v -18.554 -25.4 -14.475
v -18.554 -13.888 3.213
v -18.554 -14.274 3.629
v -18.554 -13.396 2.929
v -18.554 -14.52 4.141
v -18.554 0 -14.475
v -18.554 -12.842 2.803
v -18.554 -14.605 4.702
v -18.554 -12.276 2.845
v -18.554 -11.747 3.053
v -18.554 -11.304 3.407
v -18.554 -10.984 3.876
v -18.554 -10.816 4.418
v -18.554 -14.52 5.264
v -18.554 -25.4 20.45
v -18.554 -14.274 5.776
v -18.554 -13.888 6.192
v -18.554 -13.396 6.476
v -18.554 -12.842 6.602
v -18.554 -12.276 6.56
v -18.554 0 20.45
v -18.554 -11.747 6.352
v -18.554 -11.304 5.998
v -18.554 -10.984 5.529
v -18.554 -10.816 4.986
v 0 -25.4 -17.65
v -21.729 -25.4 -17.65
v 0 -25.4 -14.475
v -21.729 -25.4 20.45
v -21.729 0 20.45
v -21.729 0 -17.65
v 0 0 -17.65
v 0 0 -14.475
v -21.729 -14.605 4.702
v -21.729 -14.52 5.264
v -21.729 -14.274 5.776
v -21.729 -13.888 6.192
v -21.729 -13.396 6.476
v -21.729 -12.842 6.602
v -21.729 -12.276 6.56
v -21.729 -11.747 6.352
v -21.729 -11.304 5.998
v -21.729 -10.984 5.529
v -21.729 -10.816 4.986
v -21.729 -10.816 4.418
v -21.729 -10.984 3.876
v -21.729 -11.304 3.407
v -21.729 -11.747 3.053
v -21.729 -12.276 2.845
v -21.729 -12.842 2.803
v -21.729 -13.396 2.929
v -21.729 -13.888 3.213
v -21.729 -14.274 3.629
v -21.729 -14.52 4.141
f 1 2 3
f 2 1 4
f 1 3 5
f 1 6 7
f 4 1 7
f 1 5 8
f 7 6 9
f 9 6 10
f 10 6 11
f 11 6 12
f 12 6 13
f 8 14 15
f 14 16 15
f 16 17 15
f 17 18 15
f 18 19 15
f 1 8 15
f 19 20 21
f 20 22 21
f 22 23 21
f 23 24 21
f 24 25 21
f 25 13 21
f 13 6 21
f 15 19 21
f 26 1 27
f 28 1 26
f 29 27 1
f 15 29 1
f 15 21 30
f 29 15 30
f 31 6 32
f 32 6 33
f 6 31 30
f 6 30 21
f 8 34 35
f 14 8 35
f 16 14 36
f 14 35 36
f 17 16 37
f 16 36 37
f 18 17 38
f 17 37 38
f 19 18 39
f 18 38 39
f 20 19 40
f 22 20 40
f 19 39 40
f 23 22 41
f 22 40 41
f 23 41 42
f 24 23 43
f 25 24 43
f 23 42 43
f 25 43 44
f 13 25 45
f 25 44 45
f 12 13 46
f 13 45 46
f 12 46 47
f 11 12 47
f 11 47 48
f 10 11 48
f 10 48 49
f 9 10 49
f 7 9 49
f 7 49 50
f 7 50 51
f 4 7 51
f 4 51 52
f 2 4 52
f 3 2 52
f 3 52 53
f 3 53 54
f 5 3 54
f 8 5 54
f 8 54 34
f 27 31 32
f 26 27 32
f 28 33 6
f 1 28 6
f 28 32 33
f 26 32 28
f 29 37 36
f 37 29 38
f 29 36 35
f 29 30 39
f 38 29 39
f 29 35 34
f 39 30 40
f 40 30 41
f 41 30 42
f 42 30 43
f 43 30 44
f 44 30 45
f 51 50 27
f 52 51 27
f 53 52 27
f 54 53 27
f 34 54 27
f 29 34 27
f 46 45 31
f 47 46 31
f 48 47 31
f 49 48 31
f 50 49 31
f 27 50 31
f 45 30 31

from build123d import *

# Parameters (mm, degrees)
F1_DEPTH = 25.4
F2_W     = 16.371028
F2_H     = 25.4
F3_DEPTH = 25.4
F4_R     = 1.905
F5_DEPTH = 25.4


with BuildPart() as f1:
    # F0 (on Front) → F1 (new body)
    with BuildSketch(Plane.XZ):
        Polygon((-18.553972, 20.450408), (-21.728972, 20.450408), (-21.728972, -17.649592), (16.371028, -17.649592), (16.371028, -14.474592), (-18.553972, -14.474592), align=None)
    extrude(amount=F1_DEPTH)

    # F2 (on face) → F3 (cut)
    with BuildSketch(Plane(origin=(0, 0, -17.649592), x_dir=(1, 0, 0), z_dir=(0, 0, -1))):
        with Locations((8.185514, 12.7)):
            Rectangle(F2_W, F2_H)
    extrude(amount=-F3_DEPTH, mode=Mode.SUBTRACT)

    # F4 (on face) → F5 (cut)
    with BuildSketch(Plane(origin=(-21.728972, 0, 0), x_dir=(0, -1, 0), z_dir=(-1, 0, 0))):
        with Locations((12.7, 4.702408)):
            Circle(F4_R)
    extrude(amount=-F5_DEPTH, mode=Mode.SUBTRACT)


solid = f1.part
